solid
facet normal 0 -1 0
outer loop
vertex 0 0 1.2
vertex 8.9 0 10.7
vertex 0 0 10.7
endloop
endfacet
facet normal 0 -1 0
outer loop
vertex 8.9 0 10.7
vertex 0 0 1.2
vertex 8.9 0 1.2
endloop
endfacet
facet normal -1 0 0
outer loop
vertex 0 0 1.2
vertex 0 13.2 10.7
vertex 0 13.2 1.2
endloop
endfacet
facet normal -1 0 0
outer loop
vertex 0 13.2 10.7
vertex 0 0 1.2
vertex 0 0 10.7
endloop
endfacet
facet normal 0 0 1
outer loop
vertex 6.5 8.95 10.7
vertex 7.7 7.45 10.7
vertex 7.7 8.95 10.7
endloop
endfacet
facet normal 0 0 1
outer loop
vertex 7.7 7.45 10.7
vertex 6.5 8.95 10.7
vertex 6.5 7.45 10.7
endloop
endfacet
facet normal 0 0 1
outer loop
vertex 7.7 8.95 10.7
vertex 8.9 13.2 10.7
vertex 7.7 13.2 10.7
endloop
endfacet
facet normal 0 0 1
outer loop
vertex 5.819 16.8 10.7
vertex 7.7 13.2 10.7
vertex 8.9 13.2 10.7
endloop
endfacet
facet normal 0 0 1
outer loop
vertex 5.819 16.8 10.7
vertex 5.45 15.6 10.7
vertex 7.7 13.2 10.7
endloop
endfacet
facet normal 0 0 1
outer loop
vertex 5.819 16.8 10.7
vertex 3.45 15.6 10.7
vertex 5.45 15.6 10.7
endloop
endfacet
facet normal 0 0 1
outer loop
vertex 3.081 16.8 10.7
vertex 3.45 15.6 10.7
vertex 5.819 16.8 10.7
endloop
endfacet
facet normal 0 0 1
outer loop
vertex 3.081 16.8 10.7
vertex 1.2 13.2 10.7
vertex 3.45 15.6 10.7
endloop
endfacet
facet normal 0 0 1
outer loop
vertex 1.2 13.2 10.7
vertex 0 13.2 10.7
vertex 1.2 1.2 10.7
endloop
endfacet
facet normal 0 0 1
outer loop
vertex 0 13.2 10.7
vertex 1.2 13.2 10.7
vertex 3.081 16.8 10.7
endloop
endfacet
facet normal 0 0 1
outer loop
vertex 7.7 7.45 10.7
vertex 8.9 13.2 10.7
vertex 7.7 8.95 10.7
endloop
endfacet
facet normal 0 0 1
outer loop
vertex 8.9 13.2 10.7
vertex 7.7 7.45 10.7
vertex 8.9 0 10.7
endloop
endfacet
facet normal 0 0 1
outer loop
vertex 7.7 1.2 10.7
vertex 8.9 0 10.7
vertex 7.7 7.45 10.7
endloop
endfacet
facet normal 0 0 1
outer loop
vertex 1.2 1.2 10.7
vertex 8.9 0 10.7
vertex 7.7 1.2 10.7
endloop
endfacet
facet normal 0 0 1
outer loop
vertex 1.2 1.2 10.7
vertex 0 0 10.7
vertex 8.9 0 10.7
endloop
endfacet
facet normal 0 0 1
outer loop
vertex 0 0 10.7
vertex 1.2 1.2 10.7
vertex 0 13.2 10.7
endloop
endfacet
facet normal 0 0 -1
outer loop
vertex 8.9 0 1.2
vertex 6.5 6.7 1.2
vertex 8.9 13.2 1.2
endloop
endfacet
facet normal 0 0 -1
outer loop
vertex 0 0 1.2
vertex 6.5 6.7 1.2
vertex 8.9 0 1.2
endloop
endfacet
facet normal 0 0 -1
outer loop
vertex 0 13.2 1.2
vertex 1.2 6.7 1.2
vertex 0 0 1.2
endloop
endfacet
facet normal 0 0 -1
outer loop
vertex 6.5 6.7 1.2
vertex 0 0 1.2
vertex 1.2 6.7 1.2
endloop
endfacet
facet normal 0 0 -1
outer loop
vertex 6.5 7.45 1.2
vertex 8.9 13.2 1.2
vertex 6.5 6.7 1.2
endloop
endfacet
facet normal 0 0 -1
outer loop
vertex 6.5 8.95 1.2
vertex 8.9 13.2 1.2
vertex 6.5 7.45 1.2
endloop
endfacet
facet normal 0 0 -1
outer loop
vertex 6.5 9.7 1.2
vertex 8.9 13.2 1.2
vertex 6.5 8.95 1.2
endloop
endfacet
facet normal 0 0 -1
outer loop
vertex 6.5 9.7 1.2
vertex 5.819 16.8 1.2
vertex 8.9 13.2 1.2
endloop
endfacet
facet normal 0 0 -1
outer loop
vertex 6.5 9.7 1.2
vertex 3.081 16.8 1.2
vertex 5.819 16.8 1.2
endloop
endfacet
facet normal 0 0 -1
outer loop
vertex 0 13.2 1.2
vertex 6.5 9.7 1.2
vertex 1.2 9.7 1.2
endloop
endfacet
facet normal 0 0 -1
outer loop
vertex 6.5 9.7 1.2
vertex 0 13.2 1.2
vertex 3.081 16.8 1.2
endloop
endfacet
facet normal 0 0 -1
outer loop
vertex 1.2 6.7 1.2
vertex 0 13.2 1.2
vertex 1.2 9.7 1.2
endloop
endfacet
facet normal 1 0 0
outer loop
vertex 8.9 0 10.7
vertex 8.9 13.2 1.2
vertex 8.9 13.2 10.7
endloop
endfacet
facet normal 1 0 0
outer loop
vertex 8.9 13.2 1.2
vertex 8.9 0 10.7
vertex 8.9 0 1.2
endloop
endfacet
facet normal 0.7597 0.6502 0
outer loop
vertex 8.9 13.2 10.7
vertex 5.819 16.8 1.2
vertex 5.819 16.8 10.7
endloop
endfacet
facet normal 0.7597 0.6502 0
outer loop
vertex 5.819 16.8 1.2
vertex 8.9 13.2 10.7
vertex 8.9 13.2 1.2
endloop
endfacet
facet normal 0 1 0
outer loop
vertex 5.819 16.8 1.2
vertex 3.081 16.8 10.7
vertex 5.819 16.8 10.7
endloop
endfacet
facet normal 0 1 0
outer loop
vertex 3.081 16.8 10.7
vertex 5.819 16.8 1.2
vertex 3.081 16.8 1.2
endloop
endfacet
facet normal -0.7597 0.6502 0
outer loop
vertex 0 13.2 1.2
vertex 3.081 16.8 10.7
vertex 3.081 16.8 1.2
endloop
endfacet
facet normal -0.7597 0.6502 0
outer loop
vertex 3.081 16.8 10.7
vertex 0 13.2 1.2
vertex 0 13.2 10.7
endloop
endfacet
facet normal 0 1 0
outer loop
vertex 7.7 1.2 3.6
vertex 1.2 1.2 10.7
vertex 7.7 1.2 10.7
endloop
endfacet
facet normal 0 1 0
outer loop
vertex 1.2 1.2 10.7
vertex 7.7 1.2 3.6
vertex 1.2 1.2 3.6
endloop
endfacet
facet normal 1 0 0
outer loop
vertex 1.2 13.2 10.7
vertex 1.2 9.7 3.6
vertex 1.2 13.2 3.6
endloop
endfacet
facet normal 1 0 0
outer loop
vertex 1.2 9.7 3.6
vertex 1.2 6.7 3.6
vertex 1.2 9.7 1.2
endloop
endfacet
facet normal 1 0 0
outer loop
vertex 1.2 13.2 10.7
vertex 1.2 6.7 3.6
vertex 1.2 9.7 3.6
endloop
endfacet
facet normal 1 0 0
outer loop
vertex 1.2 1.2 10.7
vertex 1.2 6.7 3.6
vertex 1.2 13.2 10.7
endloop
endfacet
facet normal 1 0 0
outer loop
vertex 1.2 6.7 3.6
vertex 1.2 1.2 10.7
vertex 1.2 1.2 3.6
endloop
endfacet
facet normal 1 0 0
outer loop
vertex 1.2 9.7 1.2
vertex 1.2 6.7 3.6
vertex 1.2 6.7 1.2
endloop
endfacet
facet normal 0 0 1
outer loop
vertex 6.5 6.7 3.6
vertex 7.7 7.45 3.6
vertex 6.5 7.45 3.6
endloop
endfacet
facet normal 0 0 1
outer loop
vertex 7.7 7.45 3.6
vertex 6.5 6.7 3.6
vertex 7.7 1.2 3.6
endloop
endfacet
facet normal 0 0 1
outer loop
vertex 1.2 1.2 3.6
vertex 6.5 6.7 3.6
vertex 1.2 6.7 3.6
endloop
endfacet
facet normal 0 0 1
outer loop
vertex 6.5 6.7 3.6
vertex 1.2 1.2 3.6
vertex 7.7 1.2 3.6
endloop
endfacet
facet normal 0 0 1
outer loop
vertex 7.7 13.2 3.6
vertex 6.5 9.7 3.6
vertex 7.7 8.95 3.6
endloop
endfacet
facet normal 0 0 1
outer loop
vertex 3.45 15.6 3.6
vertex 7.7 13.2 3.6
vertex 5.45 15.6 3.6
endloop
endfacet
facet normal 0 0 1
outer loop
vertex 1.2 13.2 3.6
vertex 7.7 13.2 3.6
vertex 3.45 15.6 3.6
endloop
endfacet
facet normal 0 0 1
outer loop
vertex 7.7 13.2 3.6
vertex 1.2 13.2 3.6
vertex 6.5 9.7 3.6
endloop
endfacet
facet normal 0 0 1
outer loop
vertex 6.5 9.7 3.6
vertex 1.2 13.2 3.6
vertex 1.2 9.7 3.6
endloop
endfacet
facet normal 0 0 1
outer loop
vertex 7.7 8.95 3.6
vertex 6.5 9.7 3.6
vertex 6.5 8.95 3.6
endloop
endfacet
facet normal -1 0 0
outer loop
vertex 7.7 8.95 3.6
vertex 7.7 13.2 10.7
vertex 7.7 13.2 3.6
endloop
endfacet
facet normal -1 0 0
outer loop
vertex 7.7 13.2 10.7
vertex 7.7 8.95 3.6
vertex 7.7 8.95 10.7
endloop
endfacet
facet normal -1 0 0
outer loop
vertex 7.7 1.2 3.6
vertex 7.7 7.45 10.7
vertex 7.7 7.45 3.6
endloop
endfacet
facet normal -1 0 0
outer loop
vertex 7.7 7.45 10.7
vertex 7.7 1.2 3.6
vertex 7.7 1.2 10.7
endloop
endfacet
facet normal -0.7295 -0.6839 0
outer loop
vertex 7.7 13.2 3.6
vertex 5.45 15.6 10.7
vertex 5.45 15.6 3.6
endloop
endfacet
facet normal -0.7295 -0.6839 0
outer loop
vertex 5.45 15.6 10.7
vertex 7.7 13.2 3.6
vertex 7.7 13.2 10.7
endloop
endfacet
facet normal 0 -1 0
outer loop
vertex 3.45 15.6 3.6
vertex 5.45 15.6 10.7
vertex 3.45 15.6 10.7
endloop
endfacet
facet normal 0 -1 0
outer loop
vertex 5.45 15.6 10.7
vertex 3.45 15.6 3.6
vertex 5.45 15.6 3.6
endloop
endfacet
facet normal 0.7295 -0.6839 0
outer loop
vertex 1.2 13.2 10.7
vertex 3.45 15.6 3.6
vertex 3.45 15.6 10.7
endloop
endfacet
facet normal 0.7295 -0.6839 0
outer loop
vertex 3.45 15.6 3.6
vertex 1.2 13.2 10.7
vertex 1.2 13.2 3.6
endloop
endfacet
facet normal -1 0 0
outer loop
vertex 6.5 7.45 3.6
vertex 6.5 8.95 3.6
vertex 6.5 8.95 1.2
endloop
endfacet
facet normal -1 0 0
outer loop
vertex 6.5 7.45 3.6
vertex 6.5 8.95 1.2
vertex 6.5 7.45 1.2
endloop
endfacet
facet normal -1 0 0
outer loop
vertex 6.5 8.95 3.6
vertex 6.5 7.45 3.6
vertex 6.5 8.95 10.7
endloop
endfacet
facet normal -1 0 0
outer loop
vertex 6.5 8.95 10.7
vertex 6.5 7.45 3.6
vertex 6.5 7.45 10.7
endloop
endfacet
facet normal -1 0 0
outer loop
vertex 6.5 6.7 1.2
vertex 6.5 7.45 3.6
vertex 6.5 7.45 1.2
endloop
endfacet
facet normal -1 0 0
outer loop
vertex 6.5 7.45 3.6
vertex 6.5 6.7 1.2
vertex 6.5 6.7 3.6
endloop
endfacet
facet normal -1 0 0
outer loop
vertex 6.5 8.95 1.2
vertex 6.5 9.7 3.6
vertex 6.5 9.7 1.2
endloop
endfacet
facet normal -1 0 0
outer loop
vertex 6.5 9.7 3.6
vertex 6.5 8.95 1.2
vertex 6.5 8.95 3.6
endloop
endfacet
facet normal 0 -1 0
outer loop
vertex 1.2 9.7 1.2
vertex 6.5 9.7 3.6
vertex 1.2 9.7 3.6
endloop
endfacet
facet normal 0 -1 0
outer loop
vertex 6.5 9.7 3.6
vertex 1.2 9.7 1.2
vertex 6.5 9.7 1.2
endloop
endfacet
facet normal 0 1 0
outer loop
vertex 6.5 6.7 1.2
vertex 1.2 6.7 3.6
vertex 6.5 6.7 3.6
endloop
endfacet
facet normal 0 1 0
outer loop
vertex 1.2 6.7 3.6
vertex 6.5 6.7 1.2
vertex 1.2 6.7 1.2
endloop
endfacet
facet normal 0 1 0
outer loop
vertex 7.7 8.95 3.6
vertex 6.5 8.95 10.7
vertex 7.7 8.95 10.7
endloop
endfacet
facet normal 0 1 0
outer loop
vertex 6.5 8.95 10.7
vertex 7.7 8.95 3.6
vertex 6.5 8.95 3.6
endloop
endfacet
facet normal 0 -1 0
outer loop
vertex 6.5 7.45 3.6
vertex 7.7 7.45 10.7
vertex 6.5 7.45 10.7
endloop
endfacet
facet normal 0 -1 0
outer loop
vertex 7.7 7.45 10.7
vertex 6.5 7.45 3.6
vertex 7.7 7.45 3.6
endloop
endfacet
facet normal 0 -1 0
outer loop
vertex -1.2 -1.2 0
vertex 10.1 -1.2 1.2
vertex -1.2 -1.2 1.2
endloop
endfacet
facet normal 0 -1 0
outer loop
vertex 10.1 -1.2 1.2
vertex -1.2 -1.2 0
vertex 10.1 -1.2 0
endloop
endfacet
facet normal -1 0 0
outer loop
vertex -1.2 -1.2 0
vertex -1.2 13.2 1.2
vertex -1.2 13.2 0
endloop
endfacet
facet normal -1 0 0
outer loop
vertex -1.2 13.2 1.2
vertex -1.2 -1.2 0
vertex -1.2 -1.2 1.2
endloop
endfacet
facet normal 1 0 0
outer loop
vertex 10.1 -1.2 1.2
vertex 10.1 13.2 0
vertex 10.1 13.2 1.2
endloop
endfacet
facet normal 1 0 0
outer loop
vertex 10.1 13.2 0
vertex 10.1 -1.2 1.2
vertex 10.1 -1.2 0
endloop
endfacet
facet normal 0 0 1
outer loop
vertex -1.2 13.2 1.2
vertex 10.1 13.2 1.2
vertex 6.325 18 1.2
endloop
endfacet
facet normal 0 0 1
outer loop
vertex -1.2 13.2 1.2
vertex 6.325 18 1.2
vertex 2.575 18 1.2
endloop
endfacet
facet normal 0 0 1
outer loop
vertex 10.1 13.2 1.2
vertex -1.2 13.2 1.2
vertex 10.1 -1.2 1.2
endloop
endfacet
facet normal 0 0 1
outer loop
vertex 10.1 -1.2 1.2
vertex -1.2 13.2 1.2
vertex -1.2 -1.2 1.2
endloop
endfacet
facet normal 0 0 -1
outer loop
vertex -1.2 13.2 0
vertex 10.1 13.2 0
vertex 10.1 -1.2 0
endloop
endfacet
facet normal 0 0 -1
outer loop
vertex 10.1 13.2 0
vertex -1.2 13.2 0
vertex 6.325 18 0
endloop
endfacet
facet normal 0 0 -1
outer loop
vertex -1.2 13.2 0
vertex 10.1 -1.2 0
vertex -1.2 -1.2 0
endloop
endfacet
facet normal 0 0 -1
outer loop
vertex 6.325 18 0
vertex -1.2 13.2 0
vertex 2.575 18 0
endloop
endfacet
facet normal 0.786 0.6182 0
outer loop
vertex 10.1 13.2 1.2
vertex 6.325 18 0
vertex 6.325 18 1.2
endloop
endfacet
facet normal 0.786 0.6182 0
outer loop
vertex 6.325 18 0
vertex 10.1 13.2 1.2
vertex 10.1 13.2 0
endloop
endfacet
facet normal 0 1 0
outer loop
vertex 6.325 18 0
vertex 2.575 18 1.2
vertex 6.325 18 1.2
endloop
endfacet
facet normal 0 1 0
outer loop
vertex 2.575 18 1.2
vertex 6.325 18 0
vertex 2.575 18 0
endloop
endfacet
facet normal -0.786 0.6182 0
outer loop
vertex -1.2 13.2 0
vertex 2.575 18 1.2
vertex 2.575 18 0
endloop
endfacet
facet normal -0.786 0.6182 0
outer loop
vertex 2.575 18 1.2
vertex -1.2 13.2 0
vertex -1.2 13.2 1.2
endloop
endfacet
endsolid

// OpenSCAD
width = 6.5;
length1 = 12;
lengthTotal = 14.4;
widthTop = 2;

innerHeight = 9.5;
innerHeight1 = 8.3;

bottom = 1.2;
skirt = 1.2;
walls = 1.2;

xOffsetGuide = 6.25;
guideLength = 1.2;
guideWidth = 1.5;

/* [Hidden] */
outerHeight = bottom + innerHeight;
outerWidth = width + walls * 2;
ratio = outerWidth / width;

outerWidthTop = widthTop * ratio;

outerLength1 = length1 + walls;

outerBottomLength1 = outerLength1 + skirt;
outerBottomWidth = outerWidth + skirt * 2;
outerBottomWidthTop = outerWidthTop * ratio;

hull() {
    translate([-skirt, -skirt, 0])
        cube([outerBottomWidth, outerBottomLength1, bottom]);

    translate([(outerWidth - outerBottomWidthTop) / 2, lengthTotal + walls * 2 + skirt - 0.1, 0])
        cube([outerBottomWidthTop, 0.1, bottom]);
}

translate([0, 0, bottom]) {
    difference() {
        hull() {
            cube([outerWidth, outerLength1, innerHeight]);
        
            translate([(outerWidth - outerWidthTop) / 2, lengthTotal + walls * 2 - 0.1, 0])
                cube([outerWidthTop, 0.1, innerHeight]);
        }
        
        translate([walls, walls, bottom + innerHeight - innerHeight1]) {
            hull() {
                cube([width, length1, innerHeight]);
        
                translate([(width - widthTop) / 2, lengthTotal - 0.1, 0])
                    cube([widthTop, 0.1, innerHeight]);
            }
        }
        
        translate([walls, walls + xOffsetGuide - guideWidth / 2, 0])
            cube([width -walls, guideWidth * 2, innerHeight]);
    }
    
    translate([walls + width - guideLength, walls + xOffsetGuide, 0]) {
        cube([guideLength, guideWidth, innerHeight]);
    }
}
